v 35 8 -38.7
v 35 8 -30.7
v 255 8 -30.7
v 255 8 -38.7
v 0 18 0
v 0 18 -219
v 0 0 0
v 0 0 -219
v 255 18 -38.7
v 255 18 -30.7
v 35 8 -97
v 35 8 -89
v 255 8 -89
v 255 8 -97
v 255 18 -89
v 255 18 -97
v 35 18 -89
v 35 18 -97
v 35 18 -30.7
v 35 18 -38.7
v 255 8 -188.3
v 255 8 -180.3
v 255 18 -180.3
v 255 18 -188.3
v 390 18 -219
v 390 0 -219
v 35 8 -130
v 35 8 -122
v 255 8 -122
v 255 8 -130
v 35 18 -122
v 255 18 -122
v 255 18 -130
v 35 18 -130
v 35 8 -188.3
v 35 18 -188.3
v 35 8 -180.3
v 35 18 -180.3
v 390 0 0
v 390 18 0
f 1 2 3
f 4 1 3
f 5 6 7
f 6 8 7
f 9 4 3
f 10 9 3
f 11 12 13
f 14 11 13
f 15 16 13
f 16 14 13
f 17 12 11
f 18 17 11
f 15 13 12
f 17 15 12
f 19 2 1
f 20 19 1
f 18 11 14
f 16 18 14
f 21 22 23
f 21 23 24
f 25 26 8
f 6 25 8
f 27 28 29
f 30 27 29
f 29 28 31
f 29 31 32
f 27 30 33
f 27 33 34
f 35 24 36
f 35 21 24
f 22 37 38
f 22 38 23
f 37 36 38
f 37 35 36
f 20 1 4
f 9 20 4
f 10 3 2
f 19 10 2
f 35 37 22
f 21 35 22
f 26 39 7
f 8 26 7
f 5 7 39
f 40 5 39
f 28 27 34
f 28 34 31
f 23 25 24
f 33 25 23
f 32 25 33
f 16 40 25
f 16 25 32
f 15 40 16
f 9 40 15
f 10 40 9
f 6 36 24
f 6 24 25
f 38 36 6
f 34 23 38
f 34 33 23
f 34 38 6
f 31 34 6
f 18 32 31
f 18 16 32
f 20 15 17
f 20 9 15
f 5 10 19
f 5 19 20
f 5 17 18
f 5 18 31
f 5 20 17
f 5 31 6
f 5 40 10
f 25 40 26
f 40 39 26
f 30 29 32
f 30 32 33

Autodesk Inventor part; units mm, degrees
ref_plane "YZ Plane" through (0, 0, 0) normal (1, 0, 0) x (0, 1, 0)
ref_plane "XZ Plane" through (0, 0, 0) normal (0, 1, 0) x (-1, 0, 0)
ref_plane "XY Plane" through (0, 0, 0) normal (0, 0, 1) x (1, 0, 0)
sketch "Sketch1" plane through (0, 0, 0) normal (0, 1, 0) x (-1, 0, 0)
  line L0 (0, 0) -> (-390, 0)
  line L1 (-390, 0) -> (-390, -219)
  line L2 (-390, -219) -> (0, -219)
  line L3 (0, -219) -> (0, 0)
  line L4 (-35, -38.7) -> (-255, -38.7)
  line L5 (-255, -38.7) -> (-255, -30.7)
  line L6 (-255, -30.7) -> (-35, -30.7)
  line L7 (-35, -30.7) -> (-35, -38.7)
  line L8 (-35, -97) -> (-255, -97)
  line L9 (-255, -97) -> (-255, -89)
  line L10 (-255, -89) -> (-35, -89)
  line L11 (-35, -89) -> (-35, -97)
  line L12 (68.8158, -109.5) -> (84.9045, -109.5) construction
  line L13 (-35, -180.3) -> (-255, -180.3)
  line L14 (-255, -180.3) -> (-255, -188.3)
  line L15 (-255, -188.3) -> (-35, -188.3)
  line L16 (-35, -188.3) -> (-35, -180.3)
  line L17 (-35, -122) -> (-255, -122)
  line L18 (-255, -122) -> (-255, -130)
  line L19 (-255, -130) -> (-35, -130)
  line L20 (-35, -130) -> (-35, -122)
  point P0 (0, -109.5)
  point P1 (76.8601, -109.5)
  dimension "d0" = 219
  dimension "d1" = 50.3
  dimension "d2" = 8
  dimension "d3" = 8
  dimension "d4" = 35
  dimension "d6" = 220
  dimension "d7" = 25
  dimension "d8" = 30.7
  dimension "d9" = 30.7
  dimension "d12" = 390
extrude "Extrusion1" add sketch "Sketch1" along normal blind 18
sketch "Sketch3" plane through (0, 0, 0) normal (0, -1, 0) x (1, 0, 0)
  line L0 (390, -219) -> (0, -219) projected
  line L1 (0, 0) -> (390, 0)
  line L2 (390, 0) -> (390, -219)
  line L3 (390, -219) -> (0, -219)
  line L4 (0, -219) -> (0, 0)
  point P0 (0, -219)
extrude "Extrusion2" add sketch "Sketch3" against normal blind 8
sketch "Sketch4" plane through (0, 18, 0) normal (0, 1, 0) x (1, 0, 0)
  line L0 (375, 15) -> (270, 15)
  line L1 (270, 15) -> (270, 204)
  line L2 (270, 204) -> (375, 204)
  line L3 (375, 204) -> (375, 15)
  line L4 (390, 0) -> (390, 219) projected
  line L5 (390, 219) -> (0, 219) projected
  line L6 (0, 0) -> (390, 0) projected
  line L7 (255, 130) -> (255, 122) projected
  line L8 (270, 204) -> (374.9963, 204) construction
  line L9 (374.9963, 204) -> (374.9963, 14.9979) construction
  line L10 (374.9963, 14.9979) -> (270, 14.9979) construction
  line L11 (270, 14.9979) -> (270, 204) construction
  point P0 (375, 109.5)
  point P1 (390, 109.5)
  dimension "d24" = 105
  dimension "d25" = 189
  dimension "d27" = 15
properties part number "dubpen-platform"
